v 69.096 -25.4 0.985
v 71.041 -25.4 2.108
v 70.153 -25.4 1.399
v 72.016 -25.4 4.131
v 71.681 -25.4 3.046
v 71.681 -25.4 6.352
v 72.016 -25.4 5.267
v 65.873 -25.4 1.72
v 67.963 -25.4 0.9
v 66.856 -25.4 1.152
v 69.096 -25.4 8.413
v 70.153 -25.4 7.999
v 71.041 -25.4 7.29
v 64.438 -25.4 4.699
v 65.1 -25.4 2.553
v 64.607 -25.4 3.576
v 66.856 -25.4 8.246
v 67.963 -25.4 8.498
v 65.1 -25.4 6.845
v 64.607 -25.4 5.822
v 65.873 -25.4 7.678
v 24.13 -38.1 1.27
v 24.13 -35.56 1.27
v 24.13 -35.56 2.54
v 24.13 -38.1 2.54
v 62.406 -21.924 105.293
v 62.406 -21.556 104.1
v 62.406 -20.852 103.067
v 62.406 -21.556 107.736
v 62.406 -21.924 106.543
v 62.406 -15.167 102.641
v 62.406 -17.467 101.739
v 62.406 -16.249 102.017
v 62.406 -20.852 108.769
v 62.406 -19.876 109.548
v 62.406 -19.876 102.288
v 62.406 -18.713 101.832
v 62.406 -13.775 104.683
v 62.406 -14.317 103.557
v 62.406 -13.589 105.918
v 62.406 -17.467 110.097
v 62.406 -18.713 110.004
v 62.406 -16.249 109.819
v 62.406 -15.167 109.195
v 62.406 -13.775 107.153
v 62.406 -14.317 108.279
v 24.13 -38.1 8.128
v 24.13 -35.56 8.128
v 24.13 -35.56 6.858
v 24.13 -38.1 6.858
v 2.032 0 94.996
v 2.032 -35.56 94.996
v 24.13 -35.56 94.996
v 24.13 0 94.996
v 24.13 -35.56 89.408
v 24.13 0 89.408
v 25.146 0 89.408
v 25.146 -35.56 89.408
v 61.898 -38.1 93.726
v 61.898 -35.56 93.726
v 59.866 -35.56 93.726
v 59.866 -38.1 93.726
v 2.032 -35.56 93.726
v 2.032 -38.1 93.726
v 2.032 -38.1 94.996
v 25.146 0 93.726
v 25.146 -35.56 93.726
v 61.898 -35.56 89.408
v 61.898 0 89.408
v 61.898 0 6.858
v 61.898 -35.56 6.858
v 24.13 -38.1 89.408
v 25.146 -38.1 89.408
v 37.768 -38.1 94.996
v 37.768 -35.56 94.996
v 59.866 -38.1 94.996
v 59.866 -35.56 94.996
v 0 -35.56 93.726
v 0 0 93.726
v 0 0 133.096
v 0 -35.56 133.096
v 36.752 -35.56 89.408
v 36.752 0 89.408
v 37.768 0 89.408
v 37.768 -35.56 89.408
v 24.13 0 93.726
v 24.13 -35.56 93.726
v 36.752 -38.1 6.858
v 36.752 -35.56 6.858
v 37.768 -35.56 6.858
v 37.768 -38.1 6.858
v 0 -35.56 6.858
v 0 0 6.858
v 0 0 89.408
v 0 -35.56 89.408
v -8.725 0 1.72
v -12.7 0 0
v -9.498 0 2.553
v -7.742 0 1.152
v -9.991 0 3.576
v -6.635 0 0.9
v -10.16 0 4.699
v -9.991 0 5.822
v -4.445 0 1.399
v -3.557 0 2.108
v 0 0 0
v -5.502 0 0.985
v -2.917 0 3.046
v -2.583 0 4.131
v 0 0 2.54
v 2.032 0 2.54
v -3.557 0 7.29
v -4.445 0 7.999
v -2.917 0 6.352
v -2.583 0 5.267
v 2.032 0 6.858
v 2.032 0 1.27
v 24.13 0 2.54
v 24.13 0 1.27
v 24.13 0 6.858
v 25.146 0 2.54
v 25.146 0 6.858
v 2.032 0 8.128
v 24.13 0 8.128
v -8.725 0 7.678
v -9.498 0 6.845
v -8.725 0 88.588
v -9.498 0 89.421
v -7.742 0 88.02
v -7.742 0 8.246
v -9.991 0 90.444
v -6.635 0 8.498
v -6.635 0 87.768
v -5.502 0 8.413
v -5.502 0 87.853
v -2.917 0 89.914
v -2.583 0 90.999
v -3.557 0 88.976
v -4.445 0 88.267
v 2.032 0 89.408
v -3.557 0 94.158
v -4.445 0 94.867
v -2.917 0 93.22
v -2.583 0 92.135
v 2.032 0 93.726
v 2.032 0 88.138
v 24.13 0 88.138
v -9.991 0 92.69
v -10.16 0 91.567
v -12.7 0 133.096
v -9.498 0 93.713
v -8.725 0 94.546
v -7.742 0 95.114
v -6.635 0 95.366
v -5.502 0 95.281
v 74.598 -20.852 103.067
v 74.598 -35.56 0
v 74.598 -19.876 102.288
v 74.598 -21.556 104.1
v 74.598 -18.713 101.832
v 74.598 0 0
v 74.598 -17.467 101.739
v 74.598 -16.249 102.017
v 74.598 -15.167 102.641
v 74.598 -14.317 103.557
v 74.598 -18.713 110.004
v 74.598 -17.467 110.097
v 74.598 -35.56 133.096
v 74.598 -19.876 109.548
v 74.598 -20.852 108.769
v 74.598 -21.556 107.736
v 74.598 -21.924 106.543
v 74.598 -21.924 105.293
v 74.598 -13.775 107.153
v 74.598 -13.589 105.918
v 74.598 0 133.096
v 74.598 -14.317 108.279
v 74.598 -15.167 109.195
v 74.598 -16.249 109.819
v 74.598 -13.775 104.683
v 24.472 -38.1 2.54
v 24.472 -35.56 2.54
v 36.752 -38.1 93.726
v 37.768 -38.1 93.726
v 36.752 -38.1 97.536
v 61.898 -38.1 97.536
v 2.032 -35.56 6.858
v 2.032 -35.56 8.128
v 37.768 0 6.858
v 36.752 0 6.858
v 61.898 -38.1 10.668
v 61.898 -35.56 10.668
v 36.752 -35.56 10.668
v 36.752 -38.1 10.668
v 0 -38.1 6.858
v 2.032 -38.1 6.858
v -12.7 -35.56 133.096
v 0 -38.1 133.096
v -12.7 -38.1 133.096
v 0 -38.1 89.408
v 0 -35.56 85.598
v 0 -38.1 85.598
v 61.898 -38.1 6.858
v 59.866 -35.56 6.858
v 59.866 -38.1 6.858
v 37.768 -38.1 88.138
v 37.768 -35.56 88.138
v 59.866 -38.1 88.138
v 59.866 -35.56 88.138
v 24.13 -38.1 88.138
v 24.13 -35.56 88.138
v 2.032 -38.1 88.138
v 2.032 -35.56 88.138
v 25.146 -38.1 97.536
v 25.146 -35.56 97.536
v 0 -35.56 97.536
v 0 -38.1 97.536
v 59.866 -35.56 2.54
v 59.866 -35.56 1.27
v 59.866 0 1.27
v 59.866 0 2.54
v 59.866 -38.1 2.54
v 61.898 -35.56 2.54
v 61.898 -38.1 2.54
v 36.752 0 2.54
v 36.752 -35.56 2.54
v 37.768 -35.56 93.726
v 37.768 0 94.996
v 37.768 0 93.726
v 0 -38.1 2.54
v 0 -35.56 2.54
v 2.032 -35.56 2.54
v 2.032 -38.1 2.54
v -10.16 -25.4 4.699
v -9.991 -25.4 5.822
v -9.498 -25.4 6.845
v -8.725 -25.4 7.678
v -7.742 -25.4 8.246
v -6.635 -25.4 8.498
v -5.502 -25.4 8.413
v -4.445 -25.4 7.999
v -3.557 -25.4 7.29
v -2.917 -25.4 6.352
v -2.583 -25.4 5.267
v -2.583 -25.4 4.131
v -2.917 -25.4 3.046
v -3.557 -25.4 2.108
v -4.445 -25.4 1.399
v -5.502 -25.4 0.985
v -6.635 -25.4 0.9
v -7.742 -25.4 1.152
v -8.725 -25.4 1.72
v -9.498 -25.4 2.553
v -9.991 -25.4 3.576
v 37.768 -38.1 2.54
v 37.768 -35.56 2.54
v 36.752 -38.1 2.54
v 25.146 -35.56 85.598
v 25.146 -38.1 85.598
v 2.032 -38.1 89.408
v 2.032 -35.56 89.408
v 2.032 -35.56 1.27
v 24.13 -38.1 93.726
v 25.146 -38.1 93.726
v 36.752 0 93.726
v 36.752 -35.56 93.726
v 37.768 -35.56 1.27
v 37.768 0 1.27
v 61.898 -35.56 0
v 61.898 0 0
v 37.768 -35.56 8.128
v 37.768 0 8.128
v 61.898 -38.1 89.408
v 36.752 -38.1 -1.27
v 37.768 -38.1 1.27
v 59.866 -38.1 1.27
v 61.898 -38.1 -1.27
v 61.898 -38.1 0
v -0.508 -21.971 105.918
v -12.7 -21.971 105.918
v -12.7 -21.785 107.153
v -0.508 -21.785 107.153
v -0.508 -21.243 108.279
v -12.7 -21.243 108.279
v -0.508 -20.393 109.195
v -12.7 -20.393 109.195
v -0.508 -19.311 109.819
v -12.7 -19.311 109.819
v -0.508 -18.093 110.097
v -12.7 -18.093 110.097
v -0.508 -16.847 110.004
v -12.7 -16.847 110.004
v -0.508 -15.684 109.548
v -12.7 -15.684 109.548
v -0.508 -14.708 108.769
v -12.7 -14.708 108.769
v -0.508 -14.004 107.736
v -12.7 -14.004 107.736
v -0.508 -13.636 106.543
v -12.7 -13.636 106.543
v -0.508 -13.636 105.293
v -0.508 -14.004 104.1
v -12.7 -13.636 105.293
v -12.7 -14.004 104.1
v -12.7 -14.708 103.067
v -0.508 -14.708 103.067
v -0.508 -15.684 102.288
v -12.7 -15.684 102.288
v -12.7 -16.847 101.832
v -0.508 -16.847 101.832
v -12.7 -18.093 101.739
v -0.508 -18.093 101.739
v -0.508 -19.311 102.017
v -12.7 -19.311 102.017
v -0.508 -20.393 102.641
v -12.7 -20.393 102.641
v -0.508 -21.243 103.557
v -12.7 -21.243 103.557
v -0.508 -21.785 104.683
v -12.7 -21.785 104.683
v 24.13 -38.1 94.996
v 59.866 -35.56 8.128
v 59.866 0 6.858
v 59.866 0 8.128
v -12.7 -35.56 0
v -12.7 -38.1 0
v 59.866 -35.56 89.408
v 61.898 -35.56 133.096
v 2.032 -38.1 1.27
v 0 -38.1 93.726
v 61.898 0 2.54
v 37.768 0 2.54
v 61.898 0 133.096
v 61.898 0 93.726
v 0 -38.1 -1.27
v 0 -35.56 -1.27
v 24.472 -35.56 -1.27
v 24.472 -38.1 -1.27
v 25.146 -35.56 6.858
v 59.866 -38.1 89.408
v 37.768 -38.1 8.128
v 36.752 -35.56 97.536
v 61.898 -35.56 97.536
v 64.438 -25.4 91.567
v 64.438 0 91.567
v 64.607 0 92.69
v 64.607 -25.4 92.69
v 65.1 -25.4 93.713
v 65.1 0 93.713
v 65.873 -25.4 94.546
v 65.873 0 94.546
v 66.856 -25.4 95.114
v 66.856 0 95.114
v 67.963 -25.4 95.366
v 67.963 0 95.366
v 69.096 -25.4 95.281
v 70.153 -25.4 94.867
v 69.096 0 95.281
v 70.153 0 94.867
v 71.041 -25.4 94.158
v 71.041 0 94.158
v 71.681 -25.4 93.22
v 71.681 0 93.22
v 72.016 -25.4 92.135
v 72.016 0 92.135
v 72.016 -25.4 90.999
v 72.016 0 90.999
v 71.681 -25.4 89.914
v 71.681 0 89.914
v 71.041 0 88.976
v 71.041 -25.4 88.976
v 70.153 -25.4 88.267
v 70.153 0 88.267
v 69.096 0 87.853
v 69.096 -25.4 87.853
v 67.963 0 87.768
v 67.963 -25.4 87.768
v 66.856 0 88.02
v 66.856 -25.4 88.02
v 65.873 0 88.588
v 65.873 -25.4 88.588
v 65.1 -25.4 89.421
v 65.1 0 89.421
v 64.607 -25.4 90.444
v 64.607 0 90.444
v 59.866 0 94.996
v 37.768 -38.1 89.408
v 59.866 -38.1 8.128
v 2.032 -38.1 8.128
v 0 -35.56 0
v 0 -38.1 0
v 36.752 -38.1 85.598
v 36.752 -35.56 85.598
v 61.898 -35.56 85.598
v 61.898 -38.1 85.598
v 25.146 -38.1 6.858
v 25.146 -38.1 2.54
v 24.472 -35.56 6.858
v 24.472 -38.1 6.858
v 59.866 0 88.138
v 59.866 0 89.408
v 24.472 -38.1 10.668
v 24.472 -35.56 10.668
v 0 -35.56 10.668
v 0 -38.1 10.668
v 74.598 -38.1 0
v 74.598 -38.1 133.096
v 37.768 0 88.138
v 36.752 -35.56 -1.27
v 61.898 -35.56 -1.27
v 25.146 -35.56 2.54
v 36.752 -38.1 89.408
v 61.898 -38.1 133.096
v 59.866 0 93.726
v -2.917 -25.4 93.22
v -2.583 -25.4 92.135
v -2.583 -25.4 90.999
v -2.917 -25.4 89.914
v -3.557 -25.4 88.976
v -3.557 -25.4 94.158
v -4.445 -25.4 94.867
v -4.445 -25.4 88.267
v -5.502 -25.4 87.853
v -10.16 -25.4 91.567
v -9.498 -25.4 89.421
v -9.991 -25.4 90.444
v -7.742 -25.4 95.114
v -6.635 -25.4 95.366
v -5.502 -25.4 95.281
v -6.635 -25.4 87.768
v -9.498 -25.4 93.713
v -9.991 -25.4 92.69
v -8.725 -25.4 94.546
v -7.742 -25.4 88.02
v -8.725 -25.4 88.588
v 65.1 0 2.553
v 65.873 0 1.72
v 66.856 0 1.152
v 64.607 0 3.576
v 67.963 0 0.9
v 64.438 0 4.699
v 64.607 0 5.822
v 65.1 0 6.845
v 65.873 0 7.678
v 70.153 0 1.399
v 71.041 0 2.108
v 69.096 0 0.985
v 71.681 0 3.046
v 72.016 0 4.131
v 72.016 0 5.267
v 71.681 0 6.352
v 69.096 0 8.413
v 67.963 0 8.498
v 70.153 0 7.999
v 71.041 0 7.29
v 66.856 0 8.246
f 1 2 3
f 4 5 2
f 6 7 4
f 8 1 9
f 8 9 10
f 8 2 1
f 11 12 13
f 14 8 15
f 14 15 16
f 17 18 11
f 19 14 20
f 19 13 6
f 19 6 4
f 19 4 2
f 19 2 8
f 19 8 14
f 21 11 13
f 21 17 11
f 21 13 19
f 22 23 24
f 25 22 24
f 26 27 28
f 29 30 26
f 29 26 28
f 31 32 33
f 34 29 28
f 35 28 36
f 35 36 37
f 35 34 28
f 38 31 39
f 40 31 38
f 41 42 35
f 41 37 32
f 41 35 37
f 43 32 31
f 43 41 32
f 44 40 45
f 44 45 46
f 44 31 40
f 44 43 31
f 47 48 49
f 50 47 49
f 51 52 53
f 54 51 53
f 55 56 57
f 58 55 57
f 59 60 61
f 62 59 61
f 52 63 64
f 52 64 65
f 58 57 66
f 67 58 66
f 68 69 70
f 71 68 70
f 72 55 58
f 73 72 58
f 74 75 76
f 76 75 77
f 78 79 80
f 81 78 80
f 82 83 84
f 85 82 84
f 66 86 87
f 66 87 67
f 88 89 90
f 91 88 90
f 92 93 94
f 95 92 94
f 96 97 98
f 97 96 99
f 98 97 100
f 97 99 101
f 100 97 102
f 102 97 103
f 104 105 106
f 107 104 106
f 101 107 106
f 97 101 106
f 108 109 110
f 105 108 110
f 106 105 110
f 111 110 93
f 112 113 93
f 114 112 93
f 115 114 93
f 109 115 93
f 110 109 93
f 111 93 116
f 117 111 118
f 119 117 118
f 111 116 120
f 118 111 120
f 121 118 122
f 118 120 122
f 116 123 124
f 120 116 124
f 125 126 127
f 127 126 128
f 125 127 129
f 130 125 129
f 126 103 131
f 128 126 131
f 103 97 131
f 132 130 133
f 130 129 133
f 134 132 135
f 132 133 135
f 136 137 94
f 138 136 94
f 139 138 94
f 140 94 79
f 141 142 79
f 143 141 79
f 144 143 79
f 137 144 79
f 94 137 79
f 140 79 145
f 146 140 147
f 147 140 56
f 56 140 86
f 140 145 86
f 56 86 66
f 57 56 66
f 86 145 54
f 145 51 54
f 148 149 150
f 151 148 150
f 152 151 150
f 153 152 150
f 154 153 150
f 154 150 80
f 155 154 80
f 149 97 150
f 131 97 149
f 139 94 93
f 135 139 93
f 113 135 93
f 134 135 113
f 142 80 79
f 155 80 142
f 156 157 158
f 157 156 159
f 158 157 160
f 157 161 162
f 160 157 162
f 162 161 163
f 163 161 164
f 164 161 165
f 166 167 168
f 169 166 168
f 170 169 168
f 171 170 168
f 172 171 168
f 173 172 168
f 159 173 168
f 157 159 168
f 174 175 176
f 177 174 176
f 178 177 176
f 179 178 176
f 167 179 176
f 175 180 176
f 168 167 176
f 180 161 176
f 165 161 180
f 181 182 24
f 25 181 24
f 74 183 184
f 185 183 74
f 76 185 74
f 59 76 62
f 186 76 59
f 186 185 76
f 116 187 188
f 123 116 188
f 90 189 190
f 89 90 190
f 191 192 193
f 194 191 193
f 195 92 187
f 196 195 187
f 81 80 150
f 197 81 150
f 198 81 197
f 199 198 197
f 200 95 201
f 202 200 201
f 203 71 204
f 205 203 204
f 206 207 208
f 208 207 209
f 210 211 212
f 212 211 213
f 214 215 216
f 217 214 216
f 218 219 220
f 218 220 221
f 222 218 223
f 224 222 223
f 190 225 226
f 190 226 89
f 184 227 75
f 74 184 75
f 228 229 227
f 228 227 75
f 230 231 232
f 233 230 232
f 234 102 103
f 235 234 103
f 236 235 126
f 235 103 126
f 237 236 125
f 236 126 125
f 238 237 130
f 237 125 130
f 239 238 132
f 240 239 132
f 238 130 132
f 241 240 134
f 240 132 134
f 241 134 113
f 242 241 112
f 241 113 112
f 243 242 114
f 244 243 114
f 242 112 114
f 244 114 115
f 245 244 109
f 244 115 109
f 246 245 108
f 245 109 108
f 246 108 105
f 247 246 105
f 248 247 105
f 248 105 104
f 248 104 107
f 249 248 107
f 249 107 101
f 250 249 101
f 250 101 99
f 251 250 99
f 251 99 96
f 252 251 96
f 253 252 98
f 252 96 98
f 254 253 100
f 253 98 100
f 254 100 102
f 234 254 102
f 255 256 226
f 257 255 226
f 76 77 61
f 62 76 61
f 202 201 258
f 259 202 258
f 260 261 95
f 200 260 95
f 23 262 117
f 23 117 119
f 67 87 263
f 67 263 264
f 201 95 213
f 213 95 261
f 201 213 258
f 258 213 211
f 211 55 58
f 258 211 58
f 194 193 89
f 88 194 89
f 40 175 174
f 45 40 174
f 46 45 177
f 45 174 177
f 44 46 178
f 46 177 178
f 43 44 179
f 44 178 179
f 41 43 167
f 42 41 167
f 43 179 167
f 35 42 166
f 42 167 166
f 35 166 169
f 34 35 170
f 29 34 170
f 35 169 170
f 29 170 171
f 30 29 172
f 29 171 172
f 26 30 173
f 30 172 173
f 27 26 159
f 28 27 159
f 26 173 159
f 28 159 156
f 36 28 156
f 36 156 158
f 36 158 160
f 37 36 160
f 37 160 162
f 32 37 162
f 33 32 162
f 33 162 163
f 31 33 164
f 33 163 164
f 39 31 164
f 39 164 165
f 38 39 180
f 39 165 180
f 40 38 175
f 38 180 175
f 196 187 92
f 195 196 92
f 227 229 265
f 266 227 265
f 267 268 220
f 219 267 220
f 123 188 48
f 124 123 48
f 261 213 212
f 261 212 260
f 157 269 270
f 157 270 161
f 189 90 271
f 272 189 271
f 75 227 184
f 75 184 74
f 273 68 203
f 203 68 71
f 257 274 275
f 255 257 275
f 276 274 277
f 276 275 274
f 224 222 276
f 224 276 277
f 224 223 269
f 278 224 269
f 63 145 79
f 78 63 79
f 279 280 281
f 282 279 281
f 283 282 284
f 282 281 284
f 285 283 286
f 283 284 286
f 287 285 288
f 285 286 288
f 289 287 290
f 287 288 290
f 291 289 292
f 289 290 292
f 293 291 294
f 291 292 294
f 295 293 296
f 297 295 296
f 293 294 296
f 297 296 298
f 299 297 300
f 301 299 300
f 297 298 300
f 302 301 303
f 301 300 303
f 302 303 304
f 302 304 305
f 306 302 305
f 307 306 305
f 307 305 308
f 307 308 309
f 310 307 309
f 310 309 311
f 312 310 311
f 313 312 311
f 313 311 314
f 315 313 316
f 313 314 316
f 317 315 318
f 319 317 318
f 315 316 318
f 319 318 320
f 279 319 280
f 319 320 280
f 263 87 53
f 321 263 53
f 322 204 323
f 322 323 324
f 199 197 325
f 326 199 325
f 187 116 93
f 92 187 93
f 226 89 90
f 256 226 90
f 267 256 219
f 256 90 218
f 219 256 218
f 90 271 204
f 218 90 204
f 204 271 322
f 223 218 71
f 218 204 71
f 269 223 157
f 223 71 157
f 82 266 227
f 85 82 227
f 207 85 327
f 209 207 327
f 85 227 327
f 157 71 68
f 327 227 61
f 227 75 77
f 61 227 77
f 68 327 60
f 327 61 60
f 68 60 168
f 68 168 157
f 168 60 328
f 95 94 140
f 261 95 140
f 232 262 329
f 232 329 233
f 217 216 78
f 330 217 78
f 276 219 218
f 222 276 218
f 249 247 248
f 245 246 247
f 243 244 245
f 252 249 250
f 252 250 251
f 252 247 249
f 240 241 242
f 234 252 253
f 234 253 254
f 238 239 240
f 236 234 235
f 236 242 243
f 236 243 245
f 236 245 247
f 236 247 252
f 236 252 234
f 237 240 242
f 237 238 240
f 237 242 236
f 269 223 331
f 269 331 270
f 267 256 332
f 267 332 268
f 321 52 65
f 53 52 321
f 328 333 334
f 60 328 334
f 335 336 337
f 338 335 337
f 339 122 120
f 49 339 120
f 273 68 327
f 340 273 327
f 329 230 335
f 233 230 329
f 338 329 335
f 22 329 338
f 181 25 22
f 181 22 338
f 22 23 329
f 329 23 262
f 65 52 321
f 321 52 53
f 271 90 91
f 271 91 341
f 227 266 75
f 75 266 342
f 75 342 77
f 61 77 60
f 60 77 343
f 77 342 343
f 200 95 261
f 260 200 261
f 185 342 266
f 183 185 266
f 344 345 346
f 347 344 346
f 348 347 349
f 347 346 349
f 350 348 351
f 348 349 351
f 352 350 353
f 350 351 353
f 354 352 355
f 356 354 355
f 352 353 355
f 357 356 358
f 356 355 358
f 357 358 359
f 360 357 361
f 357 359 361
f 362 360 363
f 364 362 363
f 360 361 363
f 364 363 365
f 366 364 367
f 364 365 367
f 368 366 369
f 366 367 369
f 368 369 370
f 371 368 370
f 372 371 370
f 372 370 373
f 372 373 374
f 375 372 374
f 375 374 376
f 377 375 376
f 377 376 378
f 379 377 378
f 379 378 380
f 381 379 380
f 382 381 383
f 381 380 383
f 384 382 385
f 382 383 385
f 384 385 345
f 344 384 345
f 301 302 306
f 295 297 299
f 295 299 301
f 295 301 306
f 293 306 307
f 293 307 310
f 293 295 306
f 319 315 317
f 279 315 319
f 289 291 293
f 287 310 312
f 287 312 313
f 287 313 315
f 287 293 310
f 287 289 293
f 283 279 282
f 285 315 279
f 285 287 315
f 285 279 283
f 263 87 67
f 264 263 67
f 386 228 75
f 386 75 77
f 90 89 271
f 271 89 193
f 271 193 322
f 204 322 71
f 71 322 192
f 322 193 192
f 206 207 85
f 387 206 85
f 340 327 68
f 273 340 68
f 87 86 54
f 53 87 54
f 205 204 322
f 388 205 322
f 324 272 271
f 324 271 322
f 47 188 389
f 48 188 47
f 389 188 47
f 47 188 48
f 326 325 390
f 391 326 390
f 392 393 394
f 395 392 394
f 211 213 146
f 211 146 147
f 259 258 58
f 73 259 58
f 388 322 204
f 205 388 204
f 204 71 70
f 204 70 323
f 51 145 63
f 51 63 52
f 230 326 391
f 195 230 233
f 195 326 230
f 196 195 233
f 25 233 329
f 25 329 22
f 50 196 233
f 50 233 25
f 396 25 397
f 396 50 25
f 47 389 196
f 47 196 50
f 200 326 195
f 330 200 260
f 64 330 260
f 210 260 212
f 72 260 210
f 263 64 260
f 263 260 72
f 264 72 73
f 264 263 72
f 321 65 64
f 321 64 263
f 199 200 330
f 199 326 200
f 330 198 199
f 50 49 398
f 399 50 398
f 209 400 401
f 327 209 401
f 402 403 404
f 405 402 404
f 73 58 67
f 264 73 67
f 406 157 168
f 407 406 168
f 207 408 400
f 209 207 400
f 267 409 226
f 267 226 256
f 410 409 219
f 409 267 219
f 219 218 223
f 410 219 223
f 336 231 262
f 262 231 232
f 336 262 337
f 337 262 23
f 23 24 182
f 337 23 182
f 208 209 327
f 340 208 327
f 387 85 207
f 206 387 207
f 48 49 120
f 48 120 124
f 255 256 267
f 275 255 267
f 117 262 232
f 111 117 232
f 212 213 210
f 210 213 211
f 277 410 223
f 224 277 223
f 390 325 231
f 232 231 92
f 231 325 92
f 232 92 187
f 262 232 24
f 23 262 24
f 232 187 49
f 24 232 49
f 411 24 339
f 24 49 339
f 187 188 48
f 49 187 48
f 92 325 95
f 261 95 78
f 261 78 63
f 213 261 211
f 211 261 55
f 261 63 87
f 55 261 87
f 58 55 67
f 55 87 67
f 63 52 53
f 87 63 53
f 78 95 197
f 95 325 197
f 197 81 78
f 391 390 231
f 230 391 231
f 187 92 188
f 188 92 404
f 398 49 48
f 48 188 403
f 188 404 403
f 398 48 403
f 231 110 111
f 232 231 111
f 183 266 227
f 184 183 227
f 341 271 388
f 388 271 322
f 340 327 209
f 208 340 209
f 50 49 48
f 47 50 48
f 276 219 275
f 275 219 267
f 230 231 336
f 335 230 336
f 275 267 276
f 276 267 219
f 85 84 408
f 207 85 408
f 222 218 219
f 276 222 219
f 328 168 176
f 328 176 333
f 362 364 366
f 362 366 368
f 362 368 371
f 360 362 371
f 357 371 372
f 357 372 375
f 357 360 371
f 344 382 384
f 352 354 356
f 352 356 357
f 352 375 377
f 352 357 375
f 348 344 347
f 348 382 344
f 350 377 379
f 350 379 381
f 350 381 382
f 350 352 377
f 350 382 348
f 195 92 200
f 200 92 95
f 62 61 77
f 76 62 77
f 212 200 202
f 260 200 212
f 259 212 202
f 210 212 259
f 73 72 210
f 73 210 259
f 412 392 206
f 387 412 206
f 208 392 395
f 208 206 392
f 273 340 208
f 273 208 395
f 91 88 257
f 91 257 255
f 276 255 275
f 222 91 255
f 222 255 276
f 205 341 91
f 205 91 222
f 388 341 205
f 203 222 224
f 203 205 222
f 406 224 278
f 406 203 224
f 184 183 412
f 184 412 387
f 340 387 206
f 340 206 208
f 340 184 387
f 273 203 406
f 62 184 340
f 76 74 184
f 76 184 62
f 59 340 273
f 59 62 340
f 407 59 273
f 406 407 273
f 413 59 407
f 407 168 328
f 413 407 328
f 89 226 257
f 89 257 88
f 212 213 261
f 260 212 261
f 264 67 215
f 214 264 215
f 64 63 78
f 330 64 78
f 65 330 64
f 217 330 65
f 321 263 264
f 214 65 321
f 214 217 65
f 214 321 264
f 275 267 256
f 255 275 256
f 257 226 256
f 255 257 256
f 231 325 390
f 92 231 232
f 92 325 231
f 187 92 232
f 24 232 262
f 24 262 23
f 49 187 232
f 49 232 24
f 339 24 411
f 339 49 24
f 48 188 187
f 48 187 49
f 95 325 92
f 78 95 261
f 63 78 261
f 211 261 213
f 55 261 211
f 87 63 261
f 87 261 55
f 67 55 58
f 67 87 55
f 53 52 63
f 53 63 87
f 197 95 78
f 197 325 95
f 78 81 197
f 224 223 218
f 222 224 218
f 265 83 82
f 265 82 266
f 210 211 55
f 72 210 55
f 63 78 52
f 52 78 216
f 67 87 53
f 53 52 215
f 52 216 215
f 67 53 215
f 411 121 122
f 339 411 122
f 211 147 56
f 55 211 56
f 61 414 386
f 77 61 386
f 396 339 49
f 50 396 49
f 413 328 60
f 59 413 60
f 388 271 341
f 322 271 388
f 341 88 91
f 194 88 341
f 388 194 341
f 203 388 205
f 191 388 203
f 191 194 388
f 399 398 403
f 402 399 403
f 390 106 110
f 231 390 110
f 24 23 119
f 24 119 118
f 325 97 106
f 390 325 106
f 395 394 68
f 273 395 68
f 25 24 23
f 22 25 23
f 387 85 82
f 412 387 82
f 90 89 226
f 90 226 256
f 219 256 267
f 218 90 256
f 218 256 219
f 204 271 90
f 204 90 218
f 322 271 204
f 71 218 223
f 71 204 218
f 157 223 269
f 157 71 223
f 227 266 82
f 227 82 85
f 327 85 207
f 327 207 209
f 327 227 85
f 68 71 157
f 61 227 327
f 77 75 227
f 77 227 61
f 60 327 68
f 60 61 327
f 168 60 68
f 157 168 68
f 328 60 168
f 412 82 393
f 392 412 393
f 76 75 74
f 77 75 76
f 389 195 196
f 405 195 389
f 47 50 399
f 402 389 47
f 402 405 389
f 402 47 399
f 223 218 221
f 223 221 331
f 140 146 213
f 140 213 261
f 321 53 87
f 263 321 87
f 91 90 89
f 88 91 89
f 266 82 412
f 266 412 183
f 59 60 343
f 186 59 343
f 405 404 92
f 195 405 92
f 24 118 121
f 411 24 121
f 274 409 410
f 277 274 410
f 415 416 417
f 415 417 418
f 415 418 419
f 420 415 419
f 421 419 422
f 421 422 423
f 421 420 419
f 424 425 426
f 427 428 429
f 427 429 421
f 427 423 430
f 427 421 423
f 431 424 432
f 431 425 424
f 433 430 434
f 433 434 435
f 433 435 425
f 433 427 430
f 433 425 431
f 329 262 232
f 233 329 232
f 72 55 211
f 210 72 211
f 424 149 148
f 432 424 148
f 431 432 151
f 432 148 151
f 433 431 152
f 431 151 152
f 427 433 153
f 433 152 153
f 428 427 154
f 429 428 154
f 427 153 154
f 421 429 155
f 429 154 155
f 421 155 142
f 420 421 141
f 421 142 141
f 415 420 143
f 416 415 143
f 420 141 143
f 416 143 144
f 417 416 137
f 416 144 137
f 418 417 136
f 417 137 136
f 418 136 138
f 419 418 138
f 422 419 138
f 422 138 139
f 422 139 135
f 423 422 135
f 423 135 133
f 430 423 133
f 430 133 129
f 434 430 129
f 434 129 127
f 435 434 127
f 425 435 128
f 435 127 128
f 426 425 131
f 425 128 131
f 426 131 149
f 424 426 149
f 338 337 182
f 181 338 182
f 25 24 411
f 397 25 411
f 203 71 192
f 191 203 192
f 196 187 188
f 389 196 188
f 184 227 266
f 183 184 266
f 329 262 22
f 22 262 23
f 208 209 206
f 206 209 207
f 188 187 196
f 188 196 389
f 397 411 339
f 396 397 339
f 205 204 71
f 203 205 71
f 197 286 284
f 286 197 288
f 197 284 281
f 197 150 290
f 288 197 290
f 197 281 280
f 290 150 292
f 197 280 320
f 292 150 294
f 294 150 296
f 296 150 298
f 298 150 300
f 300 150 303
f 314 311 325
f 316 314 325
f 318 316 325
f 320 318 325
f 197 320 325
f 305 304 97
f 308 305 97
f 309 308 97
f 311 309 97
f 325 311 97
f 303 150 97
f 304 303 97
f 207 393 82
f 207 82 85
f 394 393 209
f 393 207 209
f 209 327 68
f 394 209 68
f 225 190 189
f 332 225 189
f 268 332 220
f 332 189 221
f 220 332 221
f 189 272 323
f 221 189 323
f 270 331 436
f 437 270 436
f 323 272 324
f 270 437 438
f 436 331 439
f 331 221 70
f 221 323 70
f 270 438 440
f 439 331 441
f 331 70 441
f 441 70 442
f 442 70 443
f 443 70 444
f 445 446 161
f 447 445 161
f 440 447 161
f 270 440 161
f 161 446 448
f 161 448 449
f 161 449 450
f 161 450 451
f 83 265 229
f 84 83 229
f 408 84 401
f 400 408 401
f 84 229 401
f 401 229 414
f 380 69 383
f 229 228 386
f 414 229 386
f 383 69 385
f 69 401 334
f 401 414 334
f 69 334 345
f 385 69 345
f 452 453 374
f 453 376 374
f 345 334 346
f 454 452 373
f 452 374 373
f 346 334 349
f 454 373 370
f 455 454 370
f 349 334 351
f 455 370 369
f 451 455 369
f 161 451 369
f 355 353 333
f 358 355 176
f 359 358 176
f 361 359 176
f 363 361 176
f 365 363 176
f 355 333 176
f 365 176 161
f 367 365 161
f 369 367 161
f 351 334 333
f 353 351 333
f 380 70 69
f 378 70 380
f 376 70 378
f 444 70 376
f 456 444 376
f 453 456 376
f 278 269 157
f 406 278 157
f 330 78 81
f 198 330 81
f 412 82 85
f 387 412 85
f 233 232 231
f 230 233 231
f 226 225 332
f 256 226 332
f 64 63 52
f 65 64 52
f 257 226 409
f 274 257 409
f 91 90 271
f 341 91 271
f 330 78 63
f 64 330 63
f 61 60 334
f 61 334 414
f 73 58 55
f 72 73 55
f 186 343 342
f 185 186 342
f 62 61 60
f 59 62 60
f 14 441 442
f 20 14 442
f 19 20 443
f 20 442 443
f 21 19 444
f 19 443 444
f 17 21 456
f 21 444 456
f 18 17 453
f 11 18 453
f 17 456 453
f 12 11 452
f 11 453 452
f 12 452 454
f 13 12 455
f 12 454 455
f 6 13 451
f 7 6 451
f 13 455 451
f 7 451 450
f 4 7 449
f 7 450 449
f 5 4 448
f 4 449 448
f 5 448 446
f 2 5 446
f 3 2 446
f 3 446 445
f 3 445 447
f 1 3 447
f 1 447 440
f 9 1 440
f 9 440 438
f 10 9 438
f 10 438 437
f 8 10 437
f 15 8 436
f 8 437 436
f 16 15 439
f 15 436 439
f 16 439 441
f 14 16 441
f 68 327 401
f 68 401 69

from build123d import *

# Parameters (mm, degrees)
F0_W      = 22.098
F0_H      = 4.318
F0_W_2    = 2.032
F0_H_2    = 1.27
F0_W_3    = 1.016
F1_DEPTH  = 35.56
F4_DEPTH  = 2.54
F5_R      = 4.191
F6_DEPTH  = 12.192
F7_R      = 4.191
F8_DEPTH  = 12.192
F10_R     = 3.81
F11_DEPTH = 25.4
F9_R      = 3.81
F12_DEPTH = 25.4
F13_DEPTH = 2.54


with BuildPart() as f1:
    # F0 (on Front) → F1 (new body)
    with BuildSketch(Plane.XZ):
        Polygon((0, 133.096), (-12.7, 133.096), (-12.7, 0), (0, 0), (0, 2.54), (0, 6.858), (0, 89.408), (0, 93.726), align=None)
        with Locations((13.081, 4.699)):
            Rectangle(F0_W, F0_H)
        with Locations((1.016, 4.699)):
            Rectangle(F0_W_2, F0_H)
        with Locations((13.081, 1.905)):
            Rectangle(F0_W, F0_H_2)
        with Locations((24.638, 4.699)):
            Rectangle(F0_W_3, F0_H)
        with Locations((13.081, 7.493)):
            Rectangle(F0_W, F0_H_2)
        with Locations((13.081, 91.567)):
            Rectangle(F0_W, F0_H)
        with Locations((1.016, 91.567)):
            Rectangle(F0_W_2, F0_H)
        with Locations((13.081, 94.361)):
            Rectangle(F0_W, F0_H_2)
        with Locations((24.638, 91.567)):
            Rectangle(F0_W_3, F0_H)
        with Locations((13.081, 88.773)):
            Rectangle(F0_W, F0_H_2)
    extrude(amount=F1_DEPTH)

    # F5 (on face) → F6 (cut)
    with BuildSketch(Plane(origin=(-12.7, 0, 0), x_dir=(0, -1, 0), z_dir=(-1, 0, 0))):
        with Locations((17.78, 105.918)):
            Circle(F5_R)
    extrude(amount=-F6_DEPTH, mode=Mode.SUBTRACT)

    # F10 (on face) → F11 (cut)
    with BuildSketch(Plane(origin=(0, 0, 0), x_dir=(-1, 0, 0), z_dir=(0, 1, 0))):
        with Locations((6.35, 91.567)):
            Circle(F10_R)
        with Locations((6.35, 4.699)):
            Circle(F10_R)
    extrude(amount=-F11_DEPTH, mode=Mode.SUBTRACT)


with BuildPart() as f1b:
    # F0 (on Front) → F1, piece 2 (new body)
    with BuildSketch(Plane.XZ):
        Polygon((61.8981353288, 93.726), (61.8981353288, 89.408), (61.8981353288, 6.858), (61.8981353288, 2.54), (61.8981353288, 0), (74.5981353288, 0), (74.5981353288, 133.096), (61.8981353288, 133.096), align=None)
        with Locations((48.8171353288, 1.905)):
            Rectangle(F0_W, F0_H_2)
        with Locations((48.8171353288, 4.699)):
            Rectangle(F0_W, F0_H)
        with Locations((37.2601353288, 4.699)):
            Rectangle(F0_W_3, F0_H)
        with Locations((60.8821353288, 4.699)):
            Rectangle(F0_W_2, F0_H)
        with Locations((48.8171353288, 7.493)):
            Rectangle(F0_W, F0_H_2)
        with Locations((48.8171353288, 88.773)):
            Rectangle(F0_W, F0_H_2)
        with Locations((48.8171353288, 91.567)):
            Rectangle(F0_W, F0_H)
        with Locations((37.2601353288, 91.567)):
            Rectangle(F0_W_3, F0_H)
        with Locations((60.8821353288, 91.567)):
            Rectangle(F0_W_2, F0_H)
        with Locations((48.8171353288, 94.361)):
            Rectangle(F0_W, F0_H_2)
    extrude(amount=F1_DEPTH)

    # F7 (on face) → F8 (cut)
    with BuildSketch(Plane.YZ.offset(74.5981353288)):
        with Locations((-17.78, 105.918)):
            Circle(F7_R)
    extrude(amount=-F8_DEPTH, mode=Mode.SUBTRACT)

    # F9 (on face) → F12 (cut)
    with BuildSketch(Plane(origin=(0, 0, 0), x_dir=(-1, 0, 0), z_dir=(0, 1, 0))):
        with Locations((-68.2481353288, 91.567)):
            Circle(F9_R)
        with Locations((-68.2481353288, 4.699)):
            Circle(F9_R)
    extrude(amount=-F12_DEPTH, mode=Mode.SUBTRACT)


with BuildPart() as f4:
    # F3 (on face) → F4 (new body)
    with BuildSketch(Plane.XZ.offset(35.56)):
        Polygon((36.7521353288, 89.408), (36.7521353288, 85.598), (61.8981353288, 85.598), (61.8981353288, 89.408), (59.8661353288, 89.408), (59.8661353288, 88.138), (37.7681353288, 88.138), (37.7681353288, 89.408), align=None)
    extrude(amount=F4_DEPTH)


with BuildPart() as f4b:
    # F3 (on face) → F4, piece 2 (new body)
    with BuildSketch(Plane.XZ.offset(35.56)):
        Polygon((36.7521353288, 97.536), (36.7521353288, 93.726), (37.7681353288, 93.726), (37.7681353288, 94.996), (59.8661353288, 94.996), (59.8661353288, 93.726), (61.8981353288, 93.726), (61.8981353288, 97.536), align=None)
    extrude(amount=F4_DEPTH)


with BuildPart() as f4c:
    # F3 (on face) → F4, piece 3 (new body)
    with BuildSketch(Plane.XZ.offset(35.56)):
        Polygon((61.8981353288, 6.858), (61.8981353288, 10.668), (36.7521353288, 10.668), (36.7521353288, 6.858), (37.7681353288, 6.858), (37.7681353288, 8.128), (59.8661353288, 8.128), (59.8661353288, 6.858), align=None)
    extrude(amount=F4_DEPTH)


with BuildPart() as f4d:
    # F3 (on face) → F4, piece 4 (new body)
    with BuildSketch(Plane.XZ.offset(35.56)):
        Polygon((61.8981353288, 0), (61.8981353288, 2.54), (59.8661353288, 2.54), (59.8661353288, 1.27), (37.7681353288, 1.27), (37.7681353288, 2.54), (36.7521353288, 2.54), (36.7521353288, -1.27), (61.8981353288, -1.27), align=None)
    extrude(amount=F4_DEPTH)


with BuildPart() as f4e:
    # F2 (on face) → F4, piece 5 (new body)
    with BuildSketch(Plane.XZ.offset(35.56)):
        Polygon((25.146, 97.536), (0, 97.536), (0, 93.726), (2.032, 93.726), (2.032, 94.996), (24.13, 94.996), (24.13, 93.726), (25.146, 93.726), align=None)
    extrude(amount=F4_DEPTH)


with BuildPart() as f4f:
    # F2 (on face) → F4, piece 6 (new body)
    with BuildSketch(Plane.XZ.offset(35.56)):
        Polygon((0, 89.408), (0, 85.598), (25.146, 85.598), (25.146, 89.408), (24.13, 89.408), (24.13, 88.138), (2.032, 88.138), (2.032, 89.408), align=None)
    extrude(amount=F4_DEPTH)


with BuildPart() as f4g:
    # F2 (on face) → F4, piece 7 (new body)
    with BuildSketch(Plane.XZ.offset(35.56)):
        Polygon((24.13, 6.858), (24.4717603516, 6.858), (24.4717603516, 10.668), (0, 10.668), (0, 6.858), (2.032, 6.858), (2.032, 8.128), (24.13, 8.128), align=None)
    extrude(amount=F4_DEPTH)


with BuildPart() as f4h:
    # F2 (on face) → F4, piece 8 (new body)
    with BuildSketch(Plane.XZ.offset(35.56)):
        Polygon((0, 0), (0, -1.27), (24.4717603516, -1.27), (24.4717603516, 2.54), (24.13, 2.54), (24.13, 1.27), (2.032, 1.27), (2.032, 2.54), (0, 2.54), align=None)
    extrude(amount=F4_DEPTH)


with BuildPart() as f13:
    # F13 (new): a face of the model
    f13_faces = [f1.part.faces().sort_by_distance(p)[0] for p in [
        (-3.2354290551, -35.56, 63.5445185587),
    ]]
    extrude(f13_faces, amount=F13_DEPTH)


with BuildPart() as f13b:
    # F13#2 (new): a face of the model
    f13_2_faces = [f1b.part.faces().sort_by_distance(p)[0] for p in [
        (65.1335643839, -35.56, 63.5445185587),
    ]]
    extrude(f13_2_faces, amount=F13_DEPTH)


solid = Compound([f1.part, f1b.part, f4.part, f4b.part, f4c.part, f4d.part, f4e.part, f4f.part, f4g.part, f4h.part, f13.part, f13b.part])
